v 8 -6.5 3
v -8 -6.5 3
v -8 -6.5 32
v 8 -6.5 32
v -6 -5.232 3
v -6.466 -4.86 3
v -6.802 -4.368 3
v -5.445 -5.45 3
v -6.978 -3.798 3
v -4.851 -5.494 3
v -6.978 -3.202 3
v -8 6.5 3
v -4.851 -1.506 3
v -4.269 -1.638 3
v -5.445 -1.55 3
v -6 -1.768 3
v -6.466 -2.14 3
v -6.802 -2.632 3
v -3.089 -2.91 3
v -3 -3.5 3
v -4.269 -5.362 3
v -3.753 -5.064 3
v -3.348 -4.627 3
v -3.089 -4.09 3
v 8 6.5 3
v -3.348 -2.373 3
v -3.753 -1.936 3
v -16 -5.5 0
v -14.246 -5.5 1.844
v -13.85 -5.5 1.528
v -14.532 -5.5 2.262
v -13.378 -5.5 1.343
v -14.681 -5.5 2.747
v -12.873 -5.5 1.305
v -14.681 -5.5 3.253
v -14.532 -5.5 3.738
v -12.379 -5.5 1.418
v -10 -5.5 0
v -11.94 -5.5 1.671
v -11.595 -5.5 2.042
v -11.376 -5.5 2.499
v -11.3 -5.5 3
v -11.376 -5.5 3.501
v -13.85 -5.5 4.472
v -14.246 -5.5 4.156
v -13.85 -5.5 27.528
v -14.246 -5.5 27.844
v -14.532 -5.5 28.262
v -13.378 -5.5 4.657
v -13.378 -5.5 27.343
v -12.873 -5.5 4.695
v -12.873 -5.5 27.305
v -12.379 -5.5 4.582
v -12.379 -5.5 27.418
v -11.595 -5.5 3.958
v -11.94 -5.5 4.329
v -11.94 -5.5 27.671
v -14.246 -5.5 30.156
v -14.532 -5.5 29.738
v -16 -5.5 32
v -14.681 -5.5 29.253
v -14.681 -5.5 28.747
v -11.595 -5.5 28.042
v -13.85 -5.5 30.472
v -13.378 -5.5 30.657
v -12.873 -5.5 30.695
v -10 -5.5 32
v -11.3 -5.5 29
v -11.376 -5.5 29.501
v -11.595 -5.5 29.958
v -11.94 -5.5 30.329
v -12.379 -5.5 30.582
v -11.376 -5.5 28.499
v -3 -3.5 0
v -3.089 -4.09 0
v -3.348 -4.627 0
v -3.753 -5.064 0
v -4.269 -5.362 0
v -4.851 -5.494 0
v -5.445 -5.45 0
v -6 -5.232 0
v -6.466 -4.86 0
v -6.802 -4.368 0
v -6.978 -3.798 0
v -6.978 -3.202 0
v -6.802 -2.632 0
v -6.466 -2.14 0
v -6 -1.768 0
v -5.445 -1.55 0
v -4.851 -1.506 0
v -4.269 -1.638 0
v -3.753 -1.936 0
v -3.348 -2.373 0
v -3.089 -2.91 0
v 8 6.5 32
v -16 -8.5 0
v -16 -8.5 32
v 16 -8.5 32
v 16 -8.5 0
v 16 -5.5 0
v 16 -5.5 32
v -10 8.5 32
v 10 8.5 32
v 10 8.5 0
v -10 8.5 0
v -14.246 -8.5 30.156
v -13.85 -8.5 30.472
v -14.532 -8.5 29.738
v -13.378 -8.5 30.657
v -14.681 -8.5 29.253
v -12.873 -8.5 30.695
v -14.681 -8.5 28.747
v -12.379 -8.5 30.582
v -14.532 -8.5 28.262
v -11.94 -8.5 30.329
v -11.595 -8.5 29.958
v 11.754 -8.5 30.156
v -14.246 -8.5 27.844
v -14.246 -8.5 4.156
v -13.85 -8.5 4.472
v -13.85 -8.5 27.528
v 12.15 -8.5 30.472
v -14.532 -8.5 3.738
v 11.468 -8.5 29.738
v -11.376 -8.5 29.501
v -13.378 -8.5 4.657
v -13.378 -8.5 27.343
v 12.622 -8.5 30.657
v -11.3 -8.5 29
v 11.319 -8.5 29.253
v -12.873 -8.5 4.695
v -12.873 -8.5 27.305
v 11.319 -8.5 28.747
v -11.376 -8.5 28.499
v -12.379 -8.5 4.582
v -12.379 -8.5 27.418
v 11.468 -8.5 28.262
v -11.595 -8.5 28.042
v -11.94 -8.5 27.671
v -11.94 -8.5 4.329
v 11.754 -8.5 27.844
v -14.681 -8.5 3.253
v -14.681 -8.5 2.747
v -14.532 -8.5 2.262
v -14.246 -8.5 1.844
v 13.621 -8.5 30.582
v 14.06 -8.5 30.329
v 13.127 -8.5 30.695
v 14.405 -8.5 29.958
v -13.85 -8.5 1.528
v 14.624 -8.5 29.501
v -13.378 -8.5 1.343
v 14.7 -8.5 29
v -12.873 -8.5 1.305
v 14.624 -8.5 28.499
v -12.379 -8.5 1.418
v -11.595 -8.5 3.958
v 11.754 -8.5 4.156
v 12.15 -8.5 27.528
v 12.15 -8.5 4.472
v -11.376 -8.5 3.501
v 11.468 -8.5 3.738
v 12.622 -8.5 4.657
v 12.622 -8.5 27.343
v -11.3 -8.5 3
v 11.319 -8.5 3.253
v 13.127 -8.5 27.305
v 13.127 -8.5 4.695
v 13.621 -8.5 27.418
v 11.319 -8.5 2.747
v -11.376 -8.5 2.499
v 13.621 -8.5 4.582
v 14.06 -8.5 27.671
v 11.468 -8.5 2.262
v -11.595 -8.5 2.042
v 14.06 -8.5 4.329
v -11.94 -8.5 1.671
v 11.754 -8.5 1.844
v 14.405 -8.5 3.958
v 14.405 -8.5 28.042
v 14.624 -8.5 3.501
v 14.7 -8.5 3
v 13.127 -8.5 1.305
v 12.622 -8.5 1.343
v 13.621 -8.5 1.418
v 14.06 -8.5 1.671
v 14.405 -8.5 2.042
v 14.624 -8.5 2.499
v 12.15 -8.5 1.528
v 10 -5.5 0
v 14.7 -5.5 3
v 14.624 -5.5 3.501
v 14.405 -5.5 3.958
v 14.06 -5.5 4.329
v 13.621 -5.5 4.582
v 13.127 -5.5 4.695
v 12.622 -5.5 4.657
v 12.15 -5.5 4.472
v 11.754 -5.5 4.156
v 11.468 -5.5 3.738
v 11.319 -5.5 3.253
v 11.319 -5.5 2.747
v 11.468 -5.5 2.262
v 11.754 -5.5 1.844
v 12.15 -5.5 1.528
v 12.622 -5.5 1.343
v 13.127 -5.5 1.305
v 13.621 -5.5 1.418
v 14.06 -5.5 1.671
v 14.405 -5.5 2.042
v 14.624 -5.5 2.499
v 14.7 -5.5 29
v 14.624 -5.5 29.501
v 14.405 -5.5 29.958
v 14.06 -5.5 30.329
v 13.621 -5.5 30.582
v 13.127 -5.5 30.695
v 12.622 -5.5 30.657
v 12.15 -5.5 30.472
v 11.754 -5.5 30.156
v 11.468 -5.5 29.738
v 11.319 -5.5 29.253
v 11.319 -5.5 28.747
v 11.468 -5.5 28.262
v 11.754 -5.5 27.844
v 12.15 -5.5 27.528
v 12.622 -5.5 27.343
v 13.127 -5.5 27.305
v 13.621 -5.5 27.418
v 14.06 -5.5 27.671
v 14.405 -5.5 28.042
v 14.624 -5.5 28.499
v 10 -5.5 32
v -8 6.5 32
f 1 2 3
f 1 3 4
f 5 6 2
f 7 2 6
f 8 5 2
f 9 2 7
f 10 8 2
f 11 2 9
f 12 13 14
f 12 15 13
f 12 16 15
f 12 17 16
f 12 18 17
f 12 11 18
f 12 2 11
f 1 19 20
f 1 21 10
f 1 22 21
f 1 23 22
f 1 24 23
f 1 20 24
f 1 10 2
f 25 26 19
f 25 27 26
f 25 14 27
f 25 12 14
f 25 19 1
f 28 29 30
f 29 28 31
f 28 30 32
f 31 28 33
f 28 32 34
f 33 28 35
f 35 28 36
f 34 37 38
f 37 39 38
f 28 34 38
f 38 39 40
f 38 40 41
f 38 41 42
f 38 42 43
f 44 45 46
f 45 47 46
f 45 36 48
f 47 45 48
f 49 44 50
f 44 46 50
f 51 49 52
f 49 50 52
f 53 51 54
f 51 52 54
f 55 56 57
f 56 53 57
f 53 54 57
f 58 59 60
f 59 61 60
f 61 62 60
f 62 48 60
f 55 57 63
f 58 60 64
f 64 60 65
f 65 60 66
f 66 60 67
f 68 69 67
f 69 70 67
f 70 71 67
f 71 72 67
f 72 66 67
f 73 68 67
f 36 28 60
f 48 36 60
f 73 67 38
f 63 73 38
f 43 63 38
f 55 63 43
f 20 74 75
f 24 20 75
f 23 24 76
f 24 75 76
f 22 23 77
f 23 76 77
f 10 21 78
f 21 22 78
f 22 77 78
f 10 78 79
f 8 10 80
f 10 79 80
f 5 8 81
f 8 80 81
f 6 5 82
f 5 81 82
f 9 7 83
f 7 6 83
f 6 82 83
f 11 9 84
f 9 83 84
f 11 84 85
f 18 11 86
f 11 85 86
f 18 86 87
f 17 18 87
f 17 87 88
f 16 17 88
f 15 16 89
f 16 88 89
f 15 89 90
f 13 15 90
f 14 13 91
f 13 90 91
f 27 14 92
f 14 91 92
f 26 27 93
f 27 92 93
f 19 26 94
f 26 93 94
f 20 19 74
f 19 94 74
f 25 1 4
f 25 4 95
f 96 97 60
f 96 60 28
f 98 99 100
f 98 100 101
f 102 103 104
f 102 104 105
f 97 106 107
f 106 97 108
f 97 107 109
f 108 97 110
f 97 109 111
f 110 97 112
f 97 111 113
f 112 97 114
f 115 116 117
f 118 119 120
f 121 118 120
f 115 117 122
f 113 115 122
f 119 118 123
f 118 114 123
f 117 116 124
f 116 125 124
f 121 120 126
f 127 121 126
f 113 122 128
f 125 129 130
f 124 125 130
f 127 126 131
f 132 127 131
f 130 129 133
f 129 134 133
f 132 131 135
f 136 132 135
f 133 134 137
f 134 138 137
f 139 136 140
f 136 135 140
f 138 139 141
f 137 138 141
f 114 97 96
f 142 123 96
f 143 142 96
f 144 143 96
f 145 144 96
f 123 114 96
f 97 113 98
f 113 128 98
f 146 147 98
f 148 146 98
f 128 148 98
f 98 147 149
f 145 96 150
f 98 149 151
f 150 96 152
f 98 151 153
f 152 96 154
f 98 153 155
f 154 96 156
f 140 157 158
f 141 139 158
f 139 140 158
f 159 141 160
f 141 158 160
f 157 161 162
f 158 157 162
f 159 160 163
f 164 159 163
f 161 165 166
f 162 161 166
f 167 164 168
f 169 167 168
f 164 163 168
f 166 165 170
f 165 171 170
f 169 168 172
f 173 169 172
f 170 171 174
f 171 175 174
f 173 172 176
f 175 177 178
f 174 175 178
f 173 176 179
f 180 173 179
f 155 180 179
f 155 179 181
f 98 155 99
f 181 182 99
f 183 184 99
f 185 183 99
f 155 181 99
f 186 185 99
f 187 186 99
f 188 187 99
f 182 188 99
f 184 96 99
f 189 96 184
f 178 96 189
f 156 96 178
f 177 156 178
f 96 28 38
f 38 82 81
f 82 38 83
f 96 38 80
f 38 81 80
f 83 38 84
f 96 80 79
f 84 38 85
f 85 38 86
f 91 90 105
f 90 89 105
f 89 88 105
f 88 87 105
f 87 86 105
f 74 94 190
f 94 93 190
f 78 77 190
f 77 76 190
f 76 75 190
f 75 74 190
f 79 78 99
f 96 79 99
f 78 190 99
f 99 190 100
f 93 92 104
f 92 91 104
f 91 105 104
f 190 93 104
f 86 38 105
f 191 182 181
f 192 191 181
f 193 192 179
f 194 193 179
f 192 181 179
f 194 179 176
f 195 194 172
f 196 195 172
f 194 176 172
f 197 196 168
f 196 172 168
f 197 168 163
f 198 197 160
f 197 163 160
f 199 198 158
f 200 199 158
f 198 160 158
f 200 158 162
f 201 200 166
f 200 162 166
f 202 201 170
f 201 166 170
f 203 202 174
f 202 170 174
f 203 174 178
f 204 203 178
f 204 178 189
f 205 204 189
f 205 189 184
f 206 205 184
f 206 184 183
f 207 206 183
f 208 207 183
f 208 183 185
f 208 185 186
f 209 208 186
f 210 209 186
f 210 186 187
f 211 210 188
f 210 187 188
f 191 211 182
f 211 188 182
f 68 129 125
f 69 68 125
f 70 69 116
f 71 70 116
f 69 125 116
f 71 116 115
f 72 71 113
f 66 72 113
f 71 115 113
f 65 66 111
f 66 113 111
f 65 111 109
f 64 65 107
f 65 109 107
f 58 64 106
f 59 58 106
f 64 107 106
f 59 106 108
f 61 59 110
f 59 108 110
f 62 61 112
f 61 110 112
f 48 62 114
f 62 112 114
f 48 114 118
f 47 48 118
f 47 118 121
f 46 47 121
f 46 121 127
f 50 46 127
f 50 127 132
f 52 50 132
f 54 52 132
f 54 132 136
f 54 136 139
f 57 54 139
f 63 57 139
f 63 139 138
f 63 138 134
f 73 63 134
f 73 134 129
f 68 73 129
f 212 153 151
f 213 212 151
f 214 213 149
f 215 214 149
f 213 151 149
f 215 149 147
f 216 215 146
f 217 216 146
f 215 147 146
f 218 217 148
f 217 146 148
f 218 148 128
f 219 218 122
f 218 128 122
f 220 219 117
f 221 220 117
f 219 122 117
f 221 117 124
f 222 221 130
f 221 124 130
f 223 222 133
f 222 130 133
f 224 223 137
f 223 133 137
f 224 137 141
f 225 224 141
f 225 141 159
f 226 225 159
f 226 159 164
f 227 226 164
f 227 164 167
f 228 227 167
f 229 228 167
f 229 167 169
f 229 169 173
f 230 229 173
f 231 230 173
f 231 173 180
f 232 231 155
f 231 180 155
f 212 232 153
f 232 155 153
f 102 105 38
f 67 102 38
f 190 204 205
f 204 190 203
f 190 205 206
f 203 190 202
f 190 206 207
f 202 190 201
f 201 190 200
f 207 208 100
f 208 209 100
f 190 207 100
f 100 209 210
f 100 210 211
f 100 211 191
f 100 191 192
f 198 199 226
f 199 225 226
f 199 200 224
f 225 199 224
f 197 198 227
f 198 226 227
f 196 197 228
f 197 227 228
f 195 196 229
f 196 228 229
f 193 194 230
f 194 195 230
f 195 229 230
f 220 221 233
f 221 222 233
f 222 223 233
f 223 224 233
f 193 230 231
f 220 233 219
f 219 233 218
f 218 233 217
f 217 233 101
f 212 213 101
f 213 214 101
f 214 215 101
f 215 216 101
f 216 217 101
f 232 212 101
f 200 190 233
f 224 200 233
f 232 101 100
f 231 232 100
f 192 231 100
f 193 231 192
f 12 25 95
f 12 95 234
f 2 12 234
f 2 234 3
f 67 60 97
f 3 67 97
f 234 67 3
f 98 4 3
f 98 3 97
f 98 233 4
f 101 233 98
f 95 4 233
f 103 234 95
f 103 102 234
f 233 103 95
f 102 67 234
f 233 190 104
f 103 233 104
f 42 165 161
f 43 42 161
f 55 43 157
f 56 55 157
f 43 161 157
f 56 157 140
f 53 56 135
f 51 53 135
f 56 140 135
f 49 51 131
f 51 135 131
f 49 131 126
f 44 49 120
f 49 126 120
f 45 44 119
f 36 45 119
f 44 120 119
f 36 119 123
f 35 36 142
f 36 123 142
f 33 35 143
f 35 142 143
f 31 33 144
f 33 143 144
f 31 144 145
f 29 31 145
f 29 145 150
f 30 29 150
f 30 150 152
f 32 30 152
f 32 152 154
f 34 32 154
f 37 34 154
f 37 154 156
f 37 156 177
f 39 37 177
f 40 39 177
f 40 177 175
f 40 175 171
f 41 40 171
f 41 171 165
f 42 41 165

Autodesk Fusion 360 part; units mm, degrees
sketch "Esquisse1" plane through (0, 0, 0) normal (0, 0, 1) x (1, 0, 0)
  line L0 (8, 6.5) -> (-8, 6.5)
  line L1 (-8, 6.5) -> (-8, -6.5)
  line L2 (-8, -6.5) -> (8, -6.5)
  line L3 (8, -6.5) -> (8, 6.5)
  line L4 (8, 6.5) -> (-8, -6.5) construction
  line L5 (-8, 6.5) -> (8, -6.5) construction
  line L6 (-10, -8.5) -> (10, -8.5)
  line L7 (10, -8.5) -> (10, 8.5)
  line L8 (10, 8.5) -> (-10, 8.5)
  line L9 (-10, 8.5) -> (-10, -8.5)
  circle A0 centre (-5, -3.5) radius 2
  dimension "d1" = 16
  dimension "d2" = 13
  dimension "d3" = 2
  dimension "d15" = 4
  dimension "d16" = 3
  dimension "d18" = 3
extrude "Extrusion1" add sketch "Esquisse1" along normal blind 32 contours L6 L7 L8 L9
extrude "Extrusion2" add sketch "Esquisse1" along normal blind 3 contours L0 L1 L2 L3
sketch "Esquisse2" plane through (0, -8.5, 0) normal (0, -1, 0) x (1, 0, 0)
  line L0 (-10, 0) -> (10, 0)
  line L1 (10, 0) -> (10, 32)
  line L2 (10, 32) -> (-10, 32)
  line L3 (-10, 32) -> (-10, 0)
  line L4 (16, 32) -> (-16, 32)
  line L5 (-16, 32) -> (-16, 0)
  line L6 (-16, 0) -> (16, 0)
  line L7 (16, 0) -> (16, 32)
  line L8 (16, 32) -> (-16, 0) construction
  line L9 (-16, 32) -> (16, 0) construction
  line L10 (-10, 0) -> (10, 0)
  circle A0 centre (13, 29) radius 1.7
  line L11 (0, 16) -> (16, 16) construction
  line L12 (0, 16) -> (0, 32) construction
  circle A1 centre (13, 3) radius 1.7
  circle A2 centre (-13, 3) radius 1.7
  circle A3 centre (-13, 29) radius 1.7
  point P0 (0, 16)
  dimension "d8" = 6
  dimension "d9" = 6
  dimension "d10" = 3.4
  dimension "d11" = 3
  dimension "d12" = 3
extrude "Extrusion3" add sketch "Esquisse2" against normal blind 3 contours L3 L4 L5 L6 | L1 L4 L6 L7
equation "d9 = d8"
equation "d18 = d16"
